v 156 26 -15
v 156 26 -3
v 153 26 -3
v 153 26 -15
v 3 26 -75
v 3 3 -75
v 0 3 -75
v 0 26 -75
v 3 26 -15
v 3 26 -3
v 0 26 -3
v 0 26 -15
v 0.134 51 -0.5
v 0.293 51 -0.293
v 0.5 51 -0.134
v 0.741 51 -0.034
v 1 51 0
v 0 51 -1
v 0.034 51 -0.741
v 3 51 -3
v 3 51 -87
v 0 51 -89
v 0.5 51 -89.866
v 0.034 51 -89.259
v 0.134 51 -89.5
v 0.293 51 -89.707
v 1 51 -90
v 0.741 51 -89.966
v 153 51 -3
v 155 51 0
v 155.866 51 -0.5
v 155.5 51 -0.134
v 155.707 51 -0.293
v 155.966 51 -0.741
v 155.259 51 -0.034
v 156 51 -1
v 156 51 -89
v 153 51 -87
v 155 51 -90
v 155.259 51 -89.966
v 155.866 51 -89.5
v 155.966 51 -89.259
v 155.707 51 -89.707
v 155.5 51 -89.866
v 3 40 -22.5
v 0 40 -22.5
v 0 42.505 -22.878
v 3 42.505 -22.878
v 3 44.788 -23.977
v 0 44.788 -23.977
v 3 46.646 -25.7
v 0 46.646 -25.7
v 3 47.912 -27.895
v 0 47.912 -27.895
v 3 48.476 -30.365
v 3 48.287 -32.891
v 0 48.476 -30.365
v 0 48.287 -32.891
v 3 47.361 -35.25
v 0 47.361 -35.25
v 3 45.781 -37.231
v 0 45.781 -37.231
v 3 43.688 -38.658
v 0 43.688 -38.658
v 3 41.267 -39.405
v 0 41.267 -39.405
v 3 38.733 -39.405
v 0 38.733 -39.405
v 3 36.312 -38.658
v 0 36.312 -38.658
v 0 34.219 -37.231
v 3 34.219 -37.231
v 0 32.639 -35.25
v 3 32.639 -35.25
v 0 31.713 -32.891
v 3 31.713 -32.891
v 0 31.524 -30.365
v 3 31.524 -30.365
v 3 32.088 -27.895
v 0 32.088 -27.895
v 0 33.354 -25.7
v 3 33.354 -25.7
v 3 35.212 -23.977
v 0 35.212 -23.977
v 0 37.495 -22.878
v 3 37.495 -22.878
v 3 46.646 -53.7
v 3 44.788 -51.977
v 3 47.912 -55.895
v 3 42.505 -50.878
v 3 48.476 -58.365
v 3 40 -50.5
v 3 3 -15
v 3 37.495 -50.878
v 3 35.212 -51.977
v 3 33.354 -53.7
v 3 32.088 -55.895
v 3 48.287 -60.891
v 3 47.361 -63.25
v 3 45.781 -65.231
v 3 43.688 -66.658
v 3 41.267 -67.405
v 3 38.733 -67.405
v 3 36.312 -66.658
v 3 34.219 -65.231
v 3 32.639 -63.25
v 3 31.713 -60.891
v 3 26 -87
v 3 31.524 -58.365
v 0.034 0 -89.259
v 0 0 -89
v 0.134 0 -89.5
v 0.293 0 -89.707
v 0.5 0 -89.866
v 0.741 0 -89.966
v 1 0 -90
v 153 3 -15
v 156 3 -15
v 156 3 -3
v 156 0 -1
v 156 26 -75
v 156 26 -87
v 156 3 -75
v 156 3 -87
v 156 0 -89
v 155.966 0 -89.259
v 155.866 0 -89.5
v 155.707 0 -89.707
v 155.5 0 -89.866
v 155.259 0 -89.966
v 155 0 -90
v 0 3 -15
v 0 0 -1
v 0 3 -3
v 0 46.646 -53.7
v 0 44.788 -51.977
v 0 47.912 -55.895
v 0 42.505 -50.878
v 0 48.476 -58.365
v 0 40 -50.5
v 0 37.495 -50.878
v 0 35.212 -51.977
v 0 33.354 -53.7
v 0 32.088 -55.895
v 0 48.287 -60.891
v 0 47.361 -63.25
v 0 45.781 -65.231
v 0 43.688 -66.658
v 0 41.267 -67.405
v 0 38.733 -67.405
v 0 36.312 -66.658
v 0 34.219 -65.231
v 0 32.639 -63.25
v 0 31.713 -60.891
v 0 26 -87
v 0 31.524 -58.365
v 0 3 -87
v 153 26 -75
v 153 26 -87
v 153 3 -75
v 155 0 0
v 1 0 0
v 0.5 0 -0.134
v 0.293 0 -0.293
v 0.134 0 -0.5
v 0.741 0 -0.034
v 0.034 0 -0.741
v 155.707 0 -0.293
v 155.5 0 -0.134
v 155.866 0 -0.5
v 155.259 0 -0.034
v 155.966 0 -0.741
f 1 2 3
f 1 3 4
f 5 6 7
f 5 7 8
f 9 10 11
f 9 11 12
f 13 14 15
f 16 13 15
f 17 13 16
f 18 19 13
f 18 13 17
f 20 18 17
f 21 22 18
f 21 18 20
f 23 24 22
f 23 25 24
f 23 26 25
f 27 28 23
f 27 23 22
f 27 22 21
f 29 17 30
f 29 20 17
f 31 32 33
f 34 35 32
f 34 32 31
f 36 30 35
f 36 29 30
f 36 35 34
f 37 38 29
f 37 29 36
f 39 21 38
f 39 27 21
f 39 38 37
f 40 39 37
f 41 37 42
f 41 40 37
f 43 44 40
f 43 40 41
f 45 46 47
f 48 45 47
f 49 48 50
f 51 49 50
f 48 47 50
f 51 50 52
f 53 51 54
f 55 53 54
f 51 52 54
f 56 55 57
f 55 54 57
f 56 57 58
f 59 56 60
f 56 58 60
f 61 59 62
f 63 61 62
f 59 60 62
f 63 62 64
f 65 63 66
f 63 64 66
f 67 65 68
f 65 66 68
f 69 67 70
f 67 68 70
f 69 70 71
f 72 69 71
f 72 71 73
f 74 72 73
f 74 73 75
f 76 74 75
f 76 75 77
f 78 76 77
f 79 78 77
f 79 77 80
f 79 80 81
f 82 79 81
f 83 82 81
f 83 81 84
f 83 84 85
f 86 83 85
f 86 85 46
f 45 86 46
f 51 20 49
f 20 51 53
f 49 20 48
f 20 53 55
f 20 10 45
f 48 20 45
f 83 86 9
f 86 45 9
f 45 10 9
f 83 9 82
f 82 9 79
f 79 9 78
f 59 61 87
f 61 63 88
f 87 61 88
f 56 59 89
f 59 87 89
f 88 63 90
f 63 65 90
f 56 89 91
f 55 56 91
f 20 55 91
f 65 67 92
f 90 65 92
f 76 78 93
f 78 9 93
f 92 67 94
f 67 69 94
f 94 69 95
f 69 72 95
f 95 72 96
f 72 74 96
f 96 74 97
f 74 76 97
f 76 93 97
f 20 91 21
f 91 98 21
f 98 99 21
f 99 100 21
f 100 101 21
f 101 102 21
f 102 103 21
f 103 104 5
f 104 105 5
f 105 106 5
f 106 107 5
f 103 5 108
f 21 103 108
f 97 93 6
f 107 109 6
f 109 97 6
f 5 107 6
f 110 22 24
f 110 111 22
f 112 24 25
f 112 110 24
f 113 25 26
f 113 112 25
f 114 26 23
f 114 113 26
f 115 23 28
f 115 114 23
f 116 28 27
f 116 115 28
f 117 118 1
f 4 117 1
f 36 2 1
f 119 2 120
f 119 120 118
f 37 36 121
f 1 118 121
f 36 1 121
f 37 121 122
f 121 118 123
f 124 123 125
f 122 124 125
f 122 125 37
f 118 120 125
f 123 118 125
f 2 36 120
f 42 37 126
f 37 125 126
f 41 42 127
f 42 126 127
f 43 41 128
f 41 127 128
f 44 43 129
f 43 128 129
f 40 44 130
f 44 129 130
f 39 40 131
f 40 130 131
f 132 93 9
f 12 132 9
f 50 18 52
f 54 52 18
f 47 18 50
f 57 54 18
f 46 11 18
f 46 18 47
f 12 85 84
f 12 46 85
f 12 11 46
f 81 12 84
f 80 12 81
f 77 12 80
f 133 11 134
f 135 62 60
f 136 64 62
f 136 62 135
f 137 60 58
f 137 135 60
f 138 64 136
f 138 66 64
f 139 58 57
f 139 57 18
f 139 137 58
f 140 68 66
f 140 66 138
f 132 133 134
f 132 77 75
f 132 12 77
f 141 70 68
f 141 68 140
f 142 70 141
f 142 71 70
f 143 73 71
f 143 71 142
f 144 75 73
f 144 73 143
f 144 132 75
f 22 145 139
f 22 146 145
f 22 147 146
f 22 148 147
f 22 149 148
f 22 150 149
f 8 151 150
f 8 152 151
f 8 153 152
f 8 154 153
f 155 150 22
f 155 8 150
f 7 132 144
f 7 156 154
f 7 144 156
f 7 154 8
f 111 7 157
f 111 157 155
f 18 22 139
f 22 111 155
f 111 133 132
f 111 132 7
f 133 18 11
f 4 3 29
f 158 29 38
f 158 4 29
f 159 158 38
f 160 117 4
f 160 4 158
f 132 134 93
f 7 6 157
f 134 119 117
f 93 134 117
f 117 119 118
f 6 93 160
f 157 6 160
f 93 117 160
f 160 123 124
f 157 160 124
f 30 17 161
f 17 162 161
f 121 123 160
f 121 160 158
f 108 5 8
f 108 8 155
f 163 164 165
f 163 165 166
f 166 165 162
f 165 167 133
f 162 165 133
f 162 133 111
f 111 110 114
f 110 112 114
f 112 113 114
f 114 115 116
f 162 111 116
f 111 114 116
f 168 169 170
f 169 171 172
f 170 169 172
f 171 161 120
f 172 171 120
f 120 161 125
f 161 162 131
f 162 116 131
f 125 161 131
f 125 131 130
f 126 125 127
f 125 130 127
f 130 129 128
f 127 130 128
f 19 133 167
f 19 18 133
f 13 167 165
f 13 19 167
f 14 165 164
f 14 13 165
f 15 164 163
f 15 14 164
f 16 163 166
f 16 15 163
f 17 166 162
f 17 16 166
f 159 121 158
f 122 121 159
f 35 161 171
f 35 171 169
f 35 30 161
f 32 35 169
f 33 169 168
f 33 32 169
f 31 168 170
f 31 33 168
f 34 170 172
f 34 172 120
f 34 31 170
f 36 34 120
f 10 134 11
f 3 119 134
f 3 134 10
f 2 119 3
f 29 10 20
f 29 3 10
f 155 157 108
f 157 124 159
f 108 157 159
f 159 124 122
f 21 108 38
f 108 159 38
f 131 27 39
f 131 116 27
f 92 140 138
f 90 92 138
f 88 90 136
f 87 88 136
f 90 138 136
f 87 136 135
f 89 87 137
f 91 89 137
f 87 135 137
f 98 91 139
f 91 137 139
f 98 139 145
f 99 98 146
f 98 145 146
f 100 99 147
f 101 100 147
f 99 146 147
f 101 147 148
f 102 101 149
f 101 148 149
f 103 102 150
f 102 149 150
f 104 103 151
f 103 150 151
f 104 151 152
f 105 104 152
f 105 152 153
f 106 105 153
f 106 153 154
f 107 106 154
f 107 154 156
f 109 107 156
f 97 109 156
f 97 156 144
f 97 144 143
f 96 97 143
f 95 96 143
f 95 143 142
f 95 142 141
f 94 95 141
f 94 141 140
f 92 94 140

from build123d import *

# Parameters (mm, degrees)
SKETCH1_W           = 156
SKETCH1_H           = 90
BOSS_EXTRUDE1_DEPTH = 3
SKETCH2_W           = 156
SKETCH2_H           = 90
SKETCH2_W_2         = 150
SKETCH2_H_2         = 84
BOSS_EXTRUDE2_DEPTH = 48
FILLET1_R           = 1
SKETCH3_W           = 12
SKETCH3_H           = 23
CUT_EXTRUDE2_DEPTH  = 157
SKETCH4_R           = 8.5
CUT_EXTRUDE3_DEPTH  = 10


with BuildPart() as part:
    # Sketch1 → Boss-Extrude1 (new body)
    with BuildSketch(Plane(origin=(0, 0, 0), x_dir=(1, 0, 0), z_dir=(0, 1, 0))):
        with Locations((78, 45)):
            Rectangle(SKETCH1_W, SKETCH1_H)
    extrude(amount=BOSS_EXTRUDE1_DEPTH)

    # Sketch2 → Boss-Extrude2 (add)
    with BuildSketch(Plane(origin=(0, 3, 0), x_dir=(1, 0, 0), z_dir=(0, 1, 0))):
        with Locations((78, 45)):
            Rectangle(SKETCH2_W, SKETCH2_H)
        with Locations((78, 45)):
            Rectangle(SKETCH2_W_2, SKETCH2_H_2, mode=Mode.SUBTRACT)
    extrude(amount=BOSS_EXTRUDE2_DEPTH)

    # Fillet1
    fillet1_edges = [part.edges().sort_by_distance(p)[0] for p in [
        (0, 25.5, -90),
        (156, 25.5, -90),
        (156, 25.5, 0),
        (0, 25.5, 0),
    ]]
    fillet(fillet1_edges, radius=FILLET1_R)

    # Sketch3 → Cut-Extrude2 (cut, through all)
    with BuildSketch(Plane(origin=(156, 0, 0), x_dir=(0, 0, -1), z_dir=(1, 0, 0))):
        with Locations((9, 14.5)):
            Rectangle(SKETCH3_W, SKETCH3_H)
        with Locations((81, 14.5)):
            Rectangle(SKETCH3_W, SKETCH3_H)
    extrude(amount=-CUT_EXTRUDE2_DEPTH, mode=Mode.SUBTRACT)

    # Sketch4 → Cut-Extrude3 (cut)
    with BuildSketch(Plane.ZY):
        with Locations((-59, 40)):
            Circle(SKETCH4_R)
        with Locations((-31, 40)):
            Circle(SKETCH4_R)
    extrude(amount=-CUT_EXTRUDE3_DEPTH, mode=Mode.SUBTRACT)


solid = part.part
